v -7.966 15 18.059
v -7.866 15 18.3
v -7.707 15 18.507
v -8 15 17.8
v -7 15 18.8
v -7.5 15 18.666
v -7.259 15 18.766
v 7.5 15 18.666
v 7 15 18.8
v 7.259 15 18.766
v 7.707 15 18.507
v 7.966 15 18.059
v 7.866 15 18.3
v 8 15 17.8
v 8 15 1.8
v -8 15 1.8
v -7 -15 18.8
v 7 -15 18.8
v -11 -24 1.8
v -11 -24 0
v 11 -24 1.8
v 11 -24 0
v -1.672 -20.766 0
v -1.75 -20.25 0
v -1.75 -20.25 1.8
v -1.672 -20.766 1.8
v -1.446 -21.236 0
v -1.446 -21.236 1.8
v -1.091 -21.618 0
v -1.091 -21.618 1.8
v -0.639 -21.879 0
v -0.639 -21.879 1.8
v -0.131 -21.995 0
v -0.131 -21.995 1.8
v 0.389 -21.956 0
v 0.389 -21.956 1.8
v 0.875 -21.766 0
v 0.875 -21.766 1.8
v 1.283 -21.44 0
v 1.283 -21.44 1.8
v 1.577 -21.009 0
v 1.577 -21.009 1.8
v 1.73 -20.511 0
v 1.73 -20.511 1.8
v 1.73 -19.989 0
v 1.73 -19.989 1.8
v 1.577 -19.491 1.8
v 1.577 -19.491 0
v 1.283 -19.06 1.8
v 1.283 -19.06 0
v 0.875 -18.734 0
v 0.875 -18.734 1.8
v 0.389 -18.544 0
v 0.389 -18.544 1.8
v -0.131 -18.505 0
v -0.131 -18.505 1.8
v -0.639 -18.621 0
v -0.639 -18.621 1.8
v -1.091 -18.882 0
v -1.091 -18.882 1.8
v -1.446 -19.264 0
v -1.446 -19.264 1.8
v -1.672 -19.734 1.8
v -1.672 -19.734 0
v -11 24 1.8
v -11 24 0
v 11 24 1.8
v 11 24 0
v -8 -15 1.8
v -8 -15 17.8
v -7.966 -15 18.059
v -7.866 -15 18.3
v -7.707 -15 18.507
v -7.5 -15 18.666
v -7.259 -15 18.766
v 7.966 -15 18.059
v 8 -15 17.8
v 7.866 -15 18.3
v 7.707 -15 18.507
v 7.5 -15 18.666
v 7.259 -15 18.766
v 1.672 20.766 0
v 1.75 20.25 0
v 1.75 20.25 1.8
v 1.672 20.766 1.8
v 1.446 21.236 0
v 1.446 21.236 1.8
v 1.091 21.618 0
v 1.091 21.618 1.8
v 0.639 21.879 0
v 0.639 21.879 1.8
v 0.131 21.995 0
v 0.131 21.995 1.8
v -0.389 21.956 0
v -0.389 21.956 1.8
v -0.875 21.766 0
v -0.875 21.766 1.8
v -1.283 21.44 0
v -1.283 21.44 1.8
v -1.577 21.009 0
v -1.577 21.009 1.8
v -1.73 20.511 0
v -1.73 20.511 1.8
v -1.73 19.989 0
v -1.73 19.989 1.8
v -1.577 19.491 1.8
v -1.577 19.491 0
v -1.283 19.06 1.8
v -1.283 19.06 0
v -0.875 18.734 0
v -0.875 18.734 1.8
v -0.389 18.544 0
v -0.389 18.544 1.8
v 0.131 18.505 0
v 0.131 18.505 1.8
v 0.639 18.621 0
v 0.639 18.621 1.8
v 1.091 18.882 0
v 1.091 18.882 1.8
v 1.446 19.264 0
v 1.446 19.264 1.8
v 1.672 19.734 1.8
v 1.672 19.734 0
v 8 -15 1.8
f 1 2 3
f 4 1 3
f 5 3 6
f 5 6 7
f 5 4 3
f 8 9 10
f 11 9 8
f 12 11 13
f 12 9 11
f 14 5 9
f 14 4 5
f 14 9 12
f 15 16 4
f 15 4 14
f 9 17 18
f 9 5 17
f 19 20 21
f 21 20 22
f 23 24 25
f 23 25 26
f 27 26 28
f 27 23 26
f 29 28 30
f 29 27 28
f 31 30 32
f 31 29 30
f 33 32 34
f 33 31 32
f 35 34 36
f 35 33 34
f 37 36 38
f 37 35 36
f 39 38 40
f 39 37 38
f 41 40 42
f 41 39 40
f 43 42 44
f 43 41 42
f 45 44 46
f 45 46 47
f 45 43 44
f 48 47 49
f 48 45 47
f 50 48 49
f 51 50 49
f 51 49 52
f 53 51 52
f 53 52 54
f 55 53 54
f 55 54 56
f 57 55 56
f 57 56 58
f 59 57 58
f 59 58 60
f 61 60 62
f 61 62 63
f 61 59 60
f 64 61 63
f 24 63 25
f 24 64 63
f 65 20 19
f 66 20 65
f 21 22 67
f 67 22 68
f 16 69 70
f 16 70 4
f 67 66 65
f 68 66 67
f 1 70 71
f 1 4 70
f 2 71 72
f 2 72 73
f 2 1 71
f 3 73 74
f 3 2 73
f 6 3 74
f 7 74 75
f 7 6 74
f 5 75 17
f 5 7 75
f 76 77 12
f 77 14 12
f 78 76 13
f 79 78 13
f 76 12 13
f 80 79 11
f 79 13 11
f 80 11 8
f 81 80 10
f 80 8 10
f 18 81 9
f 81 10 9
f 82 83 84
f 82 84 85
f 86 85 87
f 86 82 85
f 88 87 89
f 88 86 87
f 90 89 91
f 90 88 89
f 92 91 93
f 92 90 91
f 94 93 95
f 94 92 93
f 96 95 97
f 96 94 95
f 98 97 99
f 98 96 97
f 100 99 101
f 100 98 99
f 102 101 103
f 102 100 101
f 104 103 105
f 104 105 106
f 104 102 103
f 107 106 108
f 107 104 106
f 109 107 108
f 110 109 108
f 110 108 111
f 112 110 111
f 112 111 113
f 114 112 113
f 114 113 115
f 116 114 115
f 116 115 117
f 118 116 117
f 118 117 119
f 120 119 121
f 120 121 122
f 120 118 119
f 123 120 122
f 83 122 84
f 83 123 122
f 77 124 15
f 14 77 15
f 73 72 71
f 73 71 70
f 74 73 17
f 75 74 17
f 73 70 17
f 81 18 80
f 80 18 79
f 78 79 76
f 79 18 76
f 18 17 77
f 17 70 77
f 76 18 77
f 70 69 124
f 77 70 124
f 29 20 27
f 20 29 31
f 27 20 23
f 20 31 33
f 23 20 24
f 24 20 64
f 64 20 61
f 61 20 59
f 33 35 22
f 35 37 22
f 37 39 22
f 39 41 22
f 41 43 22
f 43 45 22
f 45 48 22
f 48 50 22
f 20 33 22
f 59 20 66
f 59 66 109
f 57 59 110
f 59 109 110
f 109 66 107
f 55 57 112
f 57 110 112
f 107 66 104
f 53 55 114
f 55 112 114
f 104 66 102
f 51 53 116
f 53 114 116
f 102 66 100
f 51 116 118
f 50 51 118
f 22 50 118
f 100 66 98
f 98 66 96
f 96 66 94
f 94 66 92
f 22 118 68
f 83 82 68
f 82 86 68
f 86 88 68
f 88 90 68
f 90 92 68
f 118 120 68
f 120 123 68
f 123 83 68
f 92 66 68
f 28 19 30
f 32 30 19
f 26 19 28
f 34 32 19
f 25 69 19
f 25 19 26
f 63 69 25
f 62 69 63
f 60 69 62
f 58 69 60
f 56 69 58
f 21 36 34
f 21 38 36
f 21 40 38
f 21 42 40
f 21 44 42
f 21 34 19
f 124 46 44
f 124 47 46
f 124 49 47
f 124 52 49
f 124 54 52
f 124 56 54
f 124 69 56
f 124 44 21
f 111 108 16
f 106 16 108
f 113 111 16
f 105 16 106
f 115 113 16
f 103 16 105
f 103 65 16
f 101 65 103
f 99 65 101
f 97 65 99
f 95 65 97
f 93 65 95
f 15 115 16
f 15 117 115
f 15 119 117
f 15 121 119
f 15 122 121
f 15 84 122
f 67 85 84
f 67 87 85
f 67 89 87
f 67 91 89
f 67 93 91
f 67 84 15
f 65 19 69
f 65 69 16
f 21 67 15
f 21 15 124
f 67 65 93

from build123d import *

# Parameters (mm, degrees)
SKETCH_1_W      = 22
SKETCH_1_H      = 48
SKETCH_1_R      = 1.75
EXTRUDE_1_DEPTH = 1.8
SKETCH_2_W      = 16
SKETCH_2_H      = 30
EXTRUDE_2_DEPTH = 17
FILLET_1_R      = 1


with BuildPart() as part:
    # 草图1 → 拉伸1 (new body)
    with BuildSketch(Plane.XY):
        Rectangle(SKETCH_1_W, SKETCH_1_H)
        with Locations((0, 20.25)):
            Circle(SKETCH_1_R, mode=Mode.SUBTRACT)
        with Locations(Location((0, -20.25, 0), (0, 0, 180))):
            Circle(SKETCH_1_R, mode=Mode.SUBTRACT)
    extrude(amount=EXTRUDE_1_DEPTH)

    # 草图2 → 拉伸2 (add)
    with BuildSketch(Plane.XY.offset(1.8)):
        Rectangle(SKETCH_2_W, SKETCH_2_H)
    extrude(amount=EXTRUDE_2_DEPTH)

    # 圆角1
    fillet_1_edges = [part.edges().sort_by_distance(p)[0] for p in [
        (-8, 0, 18.8),
        (8, 0, 18.8),
    ]]
    fillet(fillet_1_edges, radius=FILLET_1_R)


solid = part.part
